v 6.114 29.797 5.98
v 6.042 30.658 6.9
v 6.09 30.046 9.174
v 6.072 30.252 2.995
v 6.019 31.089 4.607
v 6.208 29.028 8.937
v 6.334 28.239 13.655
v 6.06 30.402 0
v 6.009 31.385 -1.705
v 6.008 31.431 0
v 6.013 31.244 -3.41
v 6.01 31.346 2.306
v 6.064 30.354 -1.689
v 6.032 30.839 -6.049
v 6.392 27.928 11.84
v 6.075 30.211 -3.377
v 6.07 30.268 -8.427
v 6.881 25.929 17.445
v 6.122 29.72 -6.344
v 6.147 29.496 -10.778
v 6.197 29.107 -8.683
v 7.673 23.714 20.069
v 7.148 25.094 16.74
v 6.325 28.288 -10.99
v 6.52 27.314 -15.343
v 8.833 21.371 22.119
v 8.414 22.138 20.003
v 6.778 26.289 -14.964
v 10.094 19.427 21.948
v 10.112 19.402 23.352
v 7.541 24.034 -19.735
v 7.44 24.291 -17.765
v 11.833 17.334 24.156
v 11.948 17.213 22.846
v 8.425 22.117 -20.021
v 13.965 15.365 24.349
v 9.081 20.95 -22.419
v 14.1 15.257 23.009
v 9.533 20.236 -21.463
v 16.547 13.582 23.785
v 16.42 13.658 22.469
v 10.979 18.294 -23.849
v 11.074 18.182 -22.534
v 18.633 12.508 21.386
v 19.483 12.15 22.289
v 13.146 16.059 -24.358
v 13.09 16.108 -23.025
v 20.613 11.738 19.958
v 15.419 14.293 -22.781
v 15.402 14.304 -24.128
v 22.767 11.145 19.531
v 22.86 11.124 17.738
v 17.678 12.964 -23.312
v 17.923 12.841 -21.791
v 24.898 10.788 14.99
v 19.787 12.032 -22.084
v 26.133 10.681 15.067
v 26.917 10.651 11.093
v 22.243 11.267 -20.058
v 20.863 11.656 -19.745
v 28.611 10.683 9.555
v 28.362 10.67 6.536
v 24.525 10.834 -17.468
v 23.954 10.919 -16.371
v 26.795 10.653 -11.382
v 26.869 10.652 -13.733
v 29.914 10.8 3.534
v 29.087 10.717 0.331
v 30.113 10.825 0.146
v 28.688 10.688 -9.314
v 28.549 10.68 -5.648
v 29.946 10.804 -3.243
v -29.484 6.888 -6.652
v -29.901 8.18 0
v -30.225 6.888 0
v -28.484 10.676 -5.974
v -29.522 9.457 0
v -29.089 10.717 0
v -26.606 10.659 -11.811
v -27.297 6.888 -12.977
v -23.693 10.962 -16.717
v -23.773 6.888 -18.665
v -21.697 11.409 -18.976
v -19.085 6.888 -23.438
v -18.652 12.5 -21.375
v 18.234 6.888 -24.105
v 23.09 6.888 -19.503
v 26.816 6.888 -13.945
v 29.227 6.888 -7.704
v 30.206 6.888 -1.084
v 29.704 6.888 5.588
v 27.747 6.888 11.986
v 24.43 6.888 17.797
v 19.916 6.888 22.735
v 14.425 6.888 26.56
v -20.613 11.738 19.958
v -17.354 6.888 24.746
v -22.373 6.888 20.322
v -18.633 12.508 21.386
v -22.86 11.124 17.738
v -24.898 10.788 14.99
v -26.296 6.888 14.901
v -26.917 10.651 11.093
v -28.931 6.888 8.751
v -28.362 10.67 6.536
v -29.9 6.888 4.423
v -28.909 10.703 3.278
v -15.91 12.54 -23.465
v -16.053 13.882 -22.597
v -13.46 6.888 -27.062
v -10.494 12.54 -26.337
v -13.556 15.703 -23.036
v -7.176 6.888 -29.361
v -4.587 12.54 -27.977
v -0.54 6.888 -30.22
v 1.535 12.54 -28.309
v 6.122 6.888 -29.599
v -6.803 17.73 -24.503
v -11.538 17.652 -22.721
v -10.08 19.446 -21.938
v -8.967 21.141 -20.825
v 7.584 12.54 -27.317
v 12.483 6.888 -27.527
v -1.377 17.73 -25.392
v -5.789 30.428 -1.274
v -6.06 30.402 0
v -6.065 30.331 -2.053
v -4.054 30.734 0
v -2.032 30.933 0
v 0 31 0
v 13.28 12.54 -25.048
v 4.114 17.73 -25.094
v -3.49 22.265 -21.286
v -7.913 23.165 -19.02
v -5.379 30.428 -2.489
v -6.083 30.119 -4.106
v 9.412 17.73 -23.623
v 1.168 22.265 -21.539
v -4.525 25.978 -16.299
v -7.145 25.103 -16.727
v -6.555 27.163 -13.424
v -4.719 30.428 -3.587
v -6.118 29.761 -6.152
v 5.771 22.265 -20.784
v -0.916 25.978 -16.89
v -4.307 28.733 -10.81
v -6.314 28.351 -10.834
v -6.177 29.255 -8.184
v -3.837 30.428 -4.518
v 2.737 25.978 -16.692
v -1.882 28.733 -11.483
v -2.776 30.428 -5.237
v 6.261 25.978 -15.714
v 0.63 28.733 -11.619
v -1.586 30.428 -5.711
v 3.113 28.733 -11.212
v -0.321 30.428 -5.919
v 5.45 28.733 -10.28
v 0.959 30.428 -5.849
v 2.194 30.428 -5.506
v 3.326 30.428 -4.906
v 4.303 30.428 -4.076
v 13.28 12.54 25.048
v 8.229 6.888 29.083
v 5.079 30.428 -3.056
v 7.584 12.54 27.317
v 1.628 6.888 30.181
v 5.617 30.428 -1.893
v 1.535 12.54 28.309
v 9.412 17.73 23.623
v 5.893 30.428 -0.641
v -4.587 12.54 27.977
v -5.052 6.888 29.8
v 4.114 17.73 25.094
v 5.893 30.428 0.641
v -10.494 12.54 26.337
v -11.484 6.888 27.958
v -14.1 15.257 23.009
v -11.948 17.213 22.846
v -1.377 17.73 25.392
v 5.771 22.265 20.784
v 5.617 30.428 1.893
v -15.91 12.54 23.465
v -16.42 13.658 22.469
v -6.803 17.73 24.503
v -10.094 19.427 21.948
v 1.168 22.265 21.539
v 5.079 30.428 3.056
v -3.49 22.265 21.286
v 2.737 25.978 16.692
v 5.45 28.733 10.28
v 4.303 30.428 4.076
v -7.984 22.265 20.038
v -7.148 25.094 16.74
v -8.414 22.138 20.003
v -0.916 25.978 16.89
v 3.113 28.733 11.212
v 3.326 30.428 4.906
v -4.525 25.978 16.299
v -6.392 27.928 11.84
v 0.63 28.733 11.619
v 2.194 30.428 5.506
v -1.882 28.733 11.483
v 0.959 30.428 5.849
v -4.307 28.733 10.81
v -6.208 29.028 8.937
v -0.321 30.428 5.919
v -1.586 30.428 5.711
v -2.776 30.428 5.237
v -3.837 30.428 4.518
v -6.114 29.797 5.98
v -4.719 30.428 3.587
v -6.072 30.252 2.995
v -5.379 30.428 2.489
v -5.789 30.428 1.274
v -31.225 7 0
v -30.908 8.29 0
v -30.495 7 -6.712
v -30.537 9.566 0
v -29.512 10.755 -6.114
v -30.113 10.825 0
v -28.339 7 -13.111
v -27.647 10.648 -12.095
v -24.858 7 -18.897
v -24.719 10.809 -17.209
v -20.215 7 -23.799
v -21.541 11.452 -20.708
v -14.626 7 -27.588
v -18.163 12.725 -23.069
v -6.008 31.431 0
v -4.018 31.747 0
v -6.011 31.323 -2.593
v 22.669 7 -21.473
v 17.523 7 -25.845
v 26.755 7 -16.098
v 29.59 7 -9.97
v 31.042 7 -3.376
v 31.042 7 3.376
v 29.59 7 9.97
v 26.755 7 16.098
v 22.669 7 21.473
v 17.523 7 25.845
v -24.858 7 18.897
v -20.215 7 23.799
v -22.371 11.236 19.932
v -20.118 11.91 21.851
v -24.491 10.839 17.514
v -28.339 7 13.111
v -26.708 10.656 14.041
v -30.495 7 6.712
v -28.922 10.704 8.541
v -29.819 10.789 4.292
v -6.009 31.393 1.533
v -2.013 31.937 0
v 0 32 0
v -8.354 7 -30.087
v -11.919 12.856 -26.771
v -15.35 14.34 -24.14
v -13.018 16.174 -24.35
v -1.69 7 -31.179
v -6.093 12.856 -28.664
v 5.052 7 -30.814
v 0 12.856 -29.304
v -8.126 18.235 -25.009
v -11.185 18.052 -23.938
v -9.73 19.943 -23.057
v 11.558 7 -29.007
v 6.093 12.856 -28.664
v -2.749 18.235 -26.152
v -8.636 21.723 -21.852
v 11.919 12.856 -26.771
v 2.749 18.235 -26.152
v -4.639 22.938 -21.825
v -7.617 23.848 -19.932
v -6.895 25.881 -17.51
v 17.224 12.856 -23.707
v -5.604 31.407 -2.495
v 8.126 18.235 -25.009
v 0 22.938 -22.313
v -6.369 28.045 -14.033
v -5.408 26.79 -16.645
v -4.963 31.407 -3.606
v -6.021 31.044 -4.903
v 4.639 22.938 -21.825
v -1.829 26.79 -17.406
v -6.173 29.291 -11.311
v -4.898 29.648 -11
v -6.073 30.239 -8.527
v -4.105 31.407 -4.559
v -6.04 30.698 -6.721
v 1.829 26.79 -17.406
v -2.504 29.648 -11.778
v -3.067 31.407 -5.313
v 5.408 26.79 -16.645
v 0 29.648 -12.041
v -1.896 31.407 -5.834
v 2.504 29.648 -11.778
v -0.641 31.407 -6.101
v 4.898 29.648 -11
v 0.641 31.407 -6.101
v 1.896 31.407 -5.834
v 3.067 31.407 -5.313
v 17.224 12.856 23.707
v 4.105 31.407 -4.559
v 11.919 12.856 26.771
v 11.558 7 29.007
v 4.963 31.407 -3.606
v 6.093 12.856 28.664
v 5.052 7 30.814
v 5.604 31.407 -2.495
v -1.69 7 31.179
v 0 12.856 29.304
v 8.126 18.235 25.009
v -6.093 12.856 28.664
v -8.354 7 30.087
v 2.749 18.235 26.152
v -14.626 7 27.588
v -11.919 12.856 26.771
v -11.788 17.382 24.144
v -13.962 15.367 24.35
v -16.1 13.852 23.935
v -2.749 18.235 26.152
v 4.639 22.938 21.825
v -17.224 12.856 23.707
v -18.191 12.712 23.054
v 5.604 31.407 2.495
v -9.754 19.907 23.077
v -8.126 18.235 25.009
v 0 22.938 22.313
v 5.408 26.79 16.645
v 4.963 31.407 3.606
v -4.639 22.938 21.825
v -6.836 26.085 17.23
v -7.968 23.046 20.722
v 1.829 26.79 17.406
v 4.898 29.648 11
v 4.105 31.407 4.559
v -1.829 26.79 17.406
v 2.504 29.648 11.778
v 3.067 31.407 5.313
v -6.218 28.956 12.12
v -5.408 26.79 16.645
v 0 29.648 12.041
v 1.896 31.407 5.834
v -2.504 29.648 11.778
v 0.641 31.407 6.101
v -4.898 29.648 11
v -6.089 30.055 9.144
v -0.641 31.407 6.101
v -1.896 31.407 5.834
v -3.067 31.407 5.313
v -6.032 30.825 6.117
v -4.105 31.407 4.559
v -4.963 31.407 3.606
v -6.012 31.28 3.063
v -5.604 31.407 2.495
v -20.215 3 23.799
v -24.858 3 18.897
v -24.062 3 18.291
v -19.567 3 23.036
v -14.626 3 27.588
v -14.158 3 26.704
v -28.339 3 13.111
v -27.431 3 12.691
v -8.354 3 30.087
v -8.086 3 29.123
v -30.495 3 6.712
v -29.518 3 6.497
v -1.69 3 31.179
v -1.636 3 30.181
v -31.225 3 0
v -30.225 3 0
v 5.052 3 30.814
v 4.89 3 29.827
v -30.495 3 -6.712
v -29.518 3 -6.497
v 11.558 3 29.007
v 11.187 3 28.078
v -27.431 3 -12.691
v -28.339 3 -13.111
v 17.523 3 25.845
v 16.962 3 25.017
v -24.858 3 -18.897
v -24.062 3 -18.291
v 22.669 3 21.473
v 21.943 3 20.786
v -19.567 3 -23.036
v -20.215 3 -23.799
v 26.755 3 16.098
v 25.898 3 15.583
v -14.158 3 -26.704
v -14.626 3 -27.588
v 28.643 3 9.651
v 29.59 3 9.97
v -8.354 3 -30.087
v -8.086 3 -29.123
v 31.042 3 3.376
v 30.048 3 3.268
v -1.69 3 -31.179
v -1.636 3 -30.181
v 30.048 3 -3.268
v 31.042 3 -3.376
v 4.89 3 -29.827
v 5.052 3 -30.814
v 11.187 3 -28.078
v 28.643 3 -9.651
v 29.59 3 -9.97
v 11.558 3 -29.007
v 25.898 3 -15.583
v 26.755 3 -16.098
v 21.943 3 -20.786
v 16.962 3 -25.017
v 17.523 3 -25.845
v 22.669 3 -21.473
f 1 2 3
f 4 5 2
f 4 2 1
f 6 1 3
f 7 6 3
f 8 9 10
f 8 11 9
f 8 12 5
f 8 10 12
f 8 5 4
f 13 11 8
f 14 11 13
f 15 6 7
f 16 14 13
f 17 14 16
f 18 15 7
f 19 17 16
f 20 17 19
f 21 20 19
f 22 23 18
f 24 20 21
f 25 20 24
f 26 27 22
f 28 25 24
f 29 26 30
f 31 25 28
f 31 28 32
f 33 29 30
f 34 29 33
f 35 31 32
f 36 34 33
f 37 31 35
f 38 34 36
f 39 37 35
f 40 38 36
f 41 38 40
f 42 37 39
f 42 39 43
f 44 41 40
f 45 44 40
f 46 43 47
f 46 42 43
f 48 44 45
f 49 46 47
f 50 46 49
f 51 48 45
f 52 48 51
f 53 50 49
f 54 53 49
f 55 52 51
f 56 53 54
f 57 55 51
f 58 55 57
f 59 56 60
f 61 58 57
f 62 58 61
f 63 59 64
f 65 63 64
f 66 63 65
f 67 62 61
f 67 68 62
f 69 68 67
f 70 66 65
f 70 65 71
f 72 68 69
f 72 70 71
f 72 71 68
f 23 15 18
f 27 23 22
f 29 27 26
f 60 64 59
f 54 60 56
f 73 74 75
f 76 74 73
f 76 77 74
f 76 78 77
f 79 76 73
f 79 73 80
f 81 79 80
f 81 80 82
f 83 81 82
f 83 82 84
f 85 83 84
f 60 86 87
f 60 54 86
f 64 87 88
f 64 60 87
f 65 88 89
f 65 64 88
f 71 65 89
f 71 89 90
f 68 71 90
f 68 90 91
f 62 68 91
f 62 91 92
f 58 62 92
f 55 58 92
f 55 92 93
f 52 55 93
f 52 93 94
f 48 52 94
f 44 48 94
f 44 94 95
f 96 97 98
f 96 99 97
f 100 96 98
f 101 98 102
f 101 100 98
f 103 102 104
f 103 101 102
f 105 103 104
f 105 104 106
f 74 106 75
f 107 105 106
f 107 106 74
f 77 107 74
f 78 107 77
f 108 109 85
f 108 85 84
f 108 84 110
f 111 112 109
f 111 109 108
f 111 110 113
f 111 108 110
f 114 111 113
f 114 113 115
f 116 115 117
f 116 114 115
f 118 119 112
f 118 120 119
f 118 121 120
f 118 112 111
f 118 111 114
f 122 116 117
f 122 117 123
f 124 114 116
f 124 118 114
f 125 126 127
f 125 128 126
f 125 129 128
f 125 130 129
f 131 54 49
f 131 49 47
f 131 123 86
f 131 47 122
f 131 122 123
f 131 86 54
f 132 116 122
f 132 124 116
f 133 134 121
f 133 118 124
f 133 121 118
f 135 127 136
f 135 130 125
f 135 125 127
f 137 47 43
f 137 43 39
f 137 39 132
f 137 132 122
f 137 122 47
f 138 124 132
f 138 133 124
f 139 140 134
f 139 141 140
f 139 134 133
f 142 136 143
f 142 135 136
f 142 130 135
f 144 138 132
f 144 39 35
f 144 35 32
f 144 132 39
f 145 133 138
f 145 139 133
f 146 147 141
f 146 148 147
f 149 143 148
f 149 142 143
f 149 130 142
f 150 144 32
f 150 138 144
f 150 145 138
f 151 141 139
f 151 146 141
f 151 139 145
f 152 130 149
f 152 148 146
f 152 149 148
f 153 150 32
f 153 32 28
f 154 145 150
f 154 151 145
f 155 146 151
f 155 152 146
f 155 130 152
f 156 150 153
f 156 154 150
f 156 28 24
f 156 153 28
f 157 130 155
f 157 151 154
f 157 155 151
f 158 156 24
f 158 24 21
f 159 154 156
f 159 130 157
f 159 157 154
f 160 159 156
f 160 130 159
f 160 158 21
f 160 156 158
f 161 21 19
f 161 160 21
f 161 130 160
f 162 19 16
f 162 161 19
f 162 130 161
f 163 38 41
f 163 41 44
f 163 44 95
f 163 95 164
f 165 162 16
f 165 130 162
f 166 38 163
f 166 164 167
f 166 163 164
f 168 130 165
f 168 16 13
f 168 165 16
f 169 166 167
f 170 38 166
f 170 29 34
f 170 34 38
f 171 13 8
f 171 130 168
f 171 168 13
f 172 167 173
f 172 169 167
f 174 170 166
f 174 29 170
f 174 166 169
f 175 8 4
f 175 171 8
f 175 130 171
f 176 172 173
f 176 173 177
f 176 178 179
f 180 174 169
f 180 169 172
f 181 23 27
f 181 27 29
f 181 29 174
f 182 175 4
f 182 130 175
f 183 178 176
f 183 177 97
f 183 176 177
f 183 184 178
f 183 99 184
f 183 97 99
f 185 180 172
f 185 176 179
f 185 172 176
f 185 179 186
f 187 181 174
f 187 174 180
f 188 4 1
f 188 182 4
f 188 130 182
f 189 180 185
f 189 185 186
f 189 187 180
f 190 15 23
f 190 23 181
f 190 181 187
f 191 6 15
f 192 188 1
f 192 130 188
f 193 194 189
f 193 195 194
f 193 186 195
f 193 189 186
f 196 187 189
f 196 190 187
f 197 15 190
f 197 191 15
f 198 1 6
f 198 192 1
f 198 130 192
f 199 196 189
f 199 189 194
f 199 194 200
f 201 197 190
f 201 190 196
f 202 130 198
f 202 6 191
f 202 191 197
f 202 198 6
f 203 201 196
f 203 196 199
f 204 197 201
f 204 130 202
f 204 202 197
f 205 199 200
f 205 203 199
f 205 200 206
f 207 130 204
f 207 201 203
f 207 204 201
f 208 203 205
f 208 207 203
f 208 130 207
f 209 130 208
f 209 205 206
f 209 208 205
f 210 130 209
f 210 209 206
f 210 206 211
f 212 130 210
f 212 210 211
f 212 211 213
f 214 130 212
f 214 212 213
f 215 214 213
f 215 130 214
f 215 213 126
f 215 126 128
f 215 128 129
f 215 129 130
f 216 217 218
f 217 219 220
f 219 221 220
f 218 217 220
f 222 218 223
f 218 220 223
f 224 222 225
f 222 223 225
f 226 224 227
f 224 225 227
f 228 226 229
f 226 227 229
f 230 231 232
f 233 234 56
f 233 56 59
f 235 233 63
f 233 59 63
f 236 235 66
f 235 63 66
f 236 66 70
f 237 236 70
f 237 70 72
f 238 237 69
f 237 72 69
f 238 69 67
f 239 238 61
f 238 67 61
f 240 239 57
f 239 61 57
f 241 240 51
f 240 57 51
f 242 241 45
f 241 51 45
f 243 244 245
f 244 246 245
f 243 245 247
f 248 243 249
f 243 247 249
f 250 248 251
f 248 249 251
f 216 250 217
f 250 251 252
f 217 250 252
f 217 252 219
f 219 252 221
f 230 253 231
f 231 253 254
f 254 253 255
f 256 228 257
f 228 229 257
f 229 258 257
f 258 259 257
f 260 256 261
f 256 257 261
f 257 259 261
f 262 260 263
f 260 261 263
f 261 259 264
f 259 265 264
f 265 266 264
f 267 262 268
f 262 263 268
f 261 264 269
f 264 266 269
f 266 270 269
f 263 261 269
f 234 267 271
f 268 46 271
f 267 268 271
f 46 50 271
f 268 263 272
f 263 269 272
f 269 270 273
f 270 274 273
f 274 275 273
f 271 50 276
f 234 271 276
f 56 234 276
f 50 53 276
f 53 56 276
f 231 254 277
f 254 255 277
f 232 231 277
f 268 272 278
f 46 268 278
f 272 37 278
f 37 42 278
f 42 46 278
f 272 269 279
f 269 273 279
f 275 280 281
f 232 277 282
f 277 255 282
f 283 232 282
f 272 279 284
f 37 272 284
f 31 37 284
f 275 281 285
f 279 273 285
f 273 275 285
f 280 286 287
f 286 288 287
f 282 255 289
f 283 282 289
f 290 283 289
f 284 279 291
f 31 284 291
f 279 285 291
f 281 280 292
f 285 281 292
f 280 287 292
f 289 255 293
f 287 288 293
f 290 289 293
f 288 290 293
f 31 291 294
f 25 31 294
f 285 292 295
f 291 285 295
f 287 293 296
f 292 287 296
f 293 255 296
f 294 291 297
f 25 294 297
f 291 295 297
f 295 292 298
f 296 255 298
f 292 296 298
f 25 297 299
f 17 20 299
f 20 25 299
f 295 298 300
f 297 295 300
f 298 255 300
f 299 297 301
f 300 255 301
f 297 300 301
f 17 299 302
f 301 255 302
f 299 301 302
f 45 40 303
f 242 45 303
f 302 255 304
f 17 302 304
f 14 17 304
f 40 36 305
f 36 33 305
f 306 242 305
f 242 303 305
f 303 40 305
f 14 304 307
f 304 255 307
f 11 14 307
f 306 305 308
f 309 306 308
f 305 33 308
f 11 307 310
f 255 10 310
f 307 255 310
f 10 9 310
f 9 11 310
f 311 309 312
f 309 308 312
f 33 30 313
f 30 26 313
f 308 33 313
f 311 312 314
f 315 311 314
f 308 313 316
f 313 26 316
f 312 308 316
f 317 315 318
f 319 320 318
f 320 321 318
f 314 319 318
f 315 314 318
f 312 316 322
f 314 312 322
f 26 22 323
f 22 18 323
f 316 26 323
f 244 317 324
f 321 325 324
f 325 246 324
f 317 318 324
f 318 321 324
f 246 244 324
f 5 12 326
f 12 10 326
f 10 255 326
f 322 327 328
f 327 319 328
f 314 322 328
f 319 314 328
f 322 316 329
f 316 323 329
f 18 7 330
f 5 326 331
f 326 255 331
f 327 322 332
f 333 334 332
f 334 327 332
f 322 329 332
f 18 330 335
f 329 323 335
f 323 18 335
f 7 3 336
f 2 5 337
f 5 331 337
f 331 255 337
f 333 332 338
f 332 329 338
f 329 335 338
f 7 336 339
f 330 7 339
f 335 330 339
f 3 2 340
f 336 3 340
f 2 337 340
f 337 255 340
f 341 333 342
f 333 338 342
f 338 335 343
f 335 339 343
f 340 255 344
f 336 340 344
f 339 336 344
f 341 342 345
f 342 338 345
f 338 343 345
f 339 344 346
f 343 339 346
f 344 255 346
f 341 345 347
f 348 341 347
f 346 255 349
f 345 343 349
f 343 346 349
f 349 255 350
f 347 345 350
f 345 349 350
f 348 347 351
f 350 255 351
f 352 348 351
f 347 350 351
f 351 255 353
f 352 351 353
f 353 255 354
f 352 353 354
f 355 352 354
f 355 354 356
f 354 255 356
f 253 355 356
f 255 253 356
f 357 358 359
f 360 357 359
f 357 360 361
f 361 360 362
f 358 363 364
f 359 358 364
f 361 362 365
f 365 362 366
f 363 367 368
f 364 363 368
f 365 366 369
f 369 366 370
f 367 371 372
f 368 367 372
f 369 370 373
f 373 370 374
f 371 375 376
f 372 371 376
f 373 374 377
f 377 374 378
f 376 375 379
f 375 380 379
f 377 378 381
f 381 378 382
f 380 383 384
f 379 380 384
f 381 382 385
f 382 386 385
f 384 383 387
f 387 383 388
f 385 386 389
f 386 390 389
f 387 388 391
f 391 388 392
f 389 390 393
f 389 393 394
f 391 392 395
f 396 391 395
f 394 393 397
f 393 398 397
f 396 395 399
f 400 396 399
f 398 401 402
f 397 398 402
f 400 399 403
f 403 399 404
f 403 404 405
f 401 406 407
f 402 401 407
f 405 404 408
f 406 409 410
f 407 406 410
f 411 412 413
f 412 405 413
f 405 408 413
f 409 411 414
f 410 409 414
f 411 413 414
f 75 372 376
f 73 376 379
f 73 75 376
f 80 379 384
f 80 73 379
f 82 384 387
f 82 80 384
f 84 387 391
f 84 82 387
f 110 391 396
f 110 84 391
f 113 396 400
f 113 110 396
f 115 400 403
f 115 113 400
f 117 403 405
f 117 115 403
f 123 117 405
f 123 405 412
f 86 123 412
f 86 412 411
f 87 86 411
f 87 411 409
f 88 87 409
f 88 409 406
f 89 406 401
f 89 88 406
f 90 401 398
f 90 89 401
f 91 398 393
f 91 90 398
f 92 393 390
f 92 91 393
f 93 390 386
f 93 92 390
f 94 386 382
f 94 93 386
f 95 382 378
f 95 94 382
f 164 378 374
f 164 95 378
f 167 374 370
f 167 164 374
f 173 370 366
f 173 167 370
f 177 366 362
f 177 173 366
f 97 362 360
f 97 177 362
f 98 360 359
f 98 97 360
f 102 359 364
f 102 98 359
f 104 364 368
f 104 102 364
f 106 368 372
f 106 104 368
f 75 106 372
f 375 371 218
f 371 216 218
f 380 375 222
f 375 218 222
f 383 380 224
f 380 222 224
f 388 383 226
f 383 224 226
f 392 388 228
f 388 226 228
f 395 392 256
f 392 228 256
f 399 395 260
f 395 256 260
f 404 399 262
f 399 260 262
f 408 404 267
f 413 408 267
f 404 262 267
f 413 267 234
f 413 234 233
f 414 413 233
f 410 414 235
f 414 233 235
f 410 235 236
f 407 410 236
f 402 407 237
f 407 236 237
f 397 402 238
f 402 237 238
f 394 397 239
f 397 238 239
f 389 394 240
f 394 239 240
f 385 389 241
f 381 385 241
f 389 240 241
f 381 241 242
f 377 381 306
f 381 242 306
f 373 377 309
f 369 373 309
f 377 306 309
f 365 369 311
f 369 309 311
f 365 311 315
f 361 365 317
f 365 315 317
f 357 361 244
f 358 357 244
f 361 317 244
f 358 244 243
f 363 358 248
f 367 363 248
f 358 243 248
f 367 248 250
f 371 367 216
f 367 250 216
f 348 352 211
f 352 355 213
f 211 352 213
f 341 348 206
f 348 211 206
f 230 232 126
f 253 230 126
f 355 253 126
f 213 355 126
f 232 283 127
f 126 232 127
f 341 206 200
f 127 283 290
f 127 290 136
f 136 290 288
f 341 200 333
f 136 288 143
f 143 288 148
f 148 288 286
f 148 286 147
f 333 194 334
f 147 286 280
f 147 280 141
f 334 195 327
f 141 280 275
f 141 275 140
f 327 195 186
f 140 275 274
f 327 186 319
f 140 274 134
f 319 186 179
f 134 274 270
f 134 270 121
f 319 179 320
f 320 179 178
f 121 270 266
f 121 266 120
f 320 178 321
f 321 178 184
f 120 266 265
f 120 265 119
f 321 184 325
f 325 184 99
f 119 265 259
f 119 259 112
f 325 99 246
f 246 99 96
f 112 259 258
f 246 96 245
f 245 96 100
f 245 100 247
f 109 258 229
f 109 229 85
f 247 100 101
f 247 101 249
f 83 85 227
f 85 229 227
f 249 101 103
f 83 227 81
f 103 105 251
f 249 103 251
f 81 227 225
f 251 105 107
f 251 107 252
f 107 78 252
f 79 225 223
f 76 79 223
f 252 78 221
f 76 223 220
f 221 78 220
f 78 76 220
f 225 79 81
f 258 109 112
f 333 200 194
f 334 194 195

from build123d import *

# Parameters (mm, degrees)
SKETCH_7_W               = 31.224989992
SKETCH_7_H               = 4
SHELL_2_T                = -1
CUT_EXTRUDE_4_DEPTH      = 55.534392818
CUT_EXTRUDE_4_DEPTH_BACK = 55.534392818


with BuildPart() as part:
    # 草图7 → 旋转12 (revolve)
    with BuildSketch(Plane.XY, mode=Mode.PRIVATE) as revolve_12_sk:
        with BuildLine():
            ThreePointArc((31.224989992, 7), (20, 24.979991994), (0, 32))
            Line((0, 32), (0, 7))
            Line((0, 7), (31.224989992, 7))
        make_face()
        with Locations((15.612494996, 5)):
            Rectangle(SKETCH_7_W, SKETCH_7_H)
    revolve(revolve_12_sk.sketch.rotate(Axis((0, 32, 0), (0, -1, 0)), 180), axis=Axis((0, 32, 0), (0, -1, 0)))

    # 抽壳2
    shell_2_openings = [part.faces().sort_by_distance(p)[0] for p in [
        (0, 3, 0),
    ]]
    offset(amount=SHELL_2_T, openings=shell_2_openings, kind=Kind.INTERSECTION)

    # 草图9 → 切除-拉伸4 (cut, two sides: drawn at the far end of the back side and taken through both)
    with BuildSketch(Plane.XY.offset(-CUT_EXTRUDE_4_DEPTH_BACK)):
        with BuildLine():
            ThreePointArc((-6.007581703, 31.431019107), (-13.478809235, 15.768247098), (-30.113359103, 10.825229952))
            ThreePointArc((-30.113359103, 10.825229952), (-20.792552221, 24.324263034), (-6.007581703, 31.431019107))
        make_face()
        with BuildLine():
            ThreePointArc((30.113359103, 10.825229952), (20.792552221, 24.324263034), (6.007581703, 31.431019107))
            ThreePointArc((6.007581703, 31.431019107), (13.478809235, 15.768247098), (30.113359103, 10.825229952))
        make_face()
    extrude(amount=CUT_EXTRUDE_4_DEPTH + CUT_EXTRUDE_4_DEPTH_BACK, mode=Mode.SUBTRACT)


solid = part.part
